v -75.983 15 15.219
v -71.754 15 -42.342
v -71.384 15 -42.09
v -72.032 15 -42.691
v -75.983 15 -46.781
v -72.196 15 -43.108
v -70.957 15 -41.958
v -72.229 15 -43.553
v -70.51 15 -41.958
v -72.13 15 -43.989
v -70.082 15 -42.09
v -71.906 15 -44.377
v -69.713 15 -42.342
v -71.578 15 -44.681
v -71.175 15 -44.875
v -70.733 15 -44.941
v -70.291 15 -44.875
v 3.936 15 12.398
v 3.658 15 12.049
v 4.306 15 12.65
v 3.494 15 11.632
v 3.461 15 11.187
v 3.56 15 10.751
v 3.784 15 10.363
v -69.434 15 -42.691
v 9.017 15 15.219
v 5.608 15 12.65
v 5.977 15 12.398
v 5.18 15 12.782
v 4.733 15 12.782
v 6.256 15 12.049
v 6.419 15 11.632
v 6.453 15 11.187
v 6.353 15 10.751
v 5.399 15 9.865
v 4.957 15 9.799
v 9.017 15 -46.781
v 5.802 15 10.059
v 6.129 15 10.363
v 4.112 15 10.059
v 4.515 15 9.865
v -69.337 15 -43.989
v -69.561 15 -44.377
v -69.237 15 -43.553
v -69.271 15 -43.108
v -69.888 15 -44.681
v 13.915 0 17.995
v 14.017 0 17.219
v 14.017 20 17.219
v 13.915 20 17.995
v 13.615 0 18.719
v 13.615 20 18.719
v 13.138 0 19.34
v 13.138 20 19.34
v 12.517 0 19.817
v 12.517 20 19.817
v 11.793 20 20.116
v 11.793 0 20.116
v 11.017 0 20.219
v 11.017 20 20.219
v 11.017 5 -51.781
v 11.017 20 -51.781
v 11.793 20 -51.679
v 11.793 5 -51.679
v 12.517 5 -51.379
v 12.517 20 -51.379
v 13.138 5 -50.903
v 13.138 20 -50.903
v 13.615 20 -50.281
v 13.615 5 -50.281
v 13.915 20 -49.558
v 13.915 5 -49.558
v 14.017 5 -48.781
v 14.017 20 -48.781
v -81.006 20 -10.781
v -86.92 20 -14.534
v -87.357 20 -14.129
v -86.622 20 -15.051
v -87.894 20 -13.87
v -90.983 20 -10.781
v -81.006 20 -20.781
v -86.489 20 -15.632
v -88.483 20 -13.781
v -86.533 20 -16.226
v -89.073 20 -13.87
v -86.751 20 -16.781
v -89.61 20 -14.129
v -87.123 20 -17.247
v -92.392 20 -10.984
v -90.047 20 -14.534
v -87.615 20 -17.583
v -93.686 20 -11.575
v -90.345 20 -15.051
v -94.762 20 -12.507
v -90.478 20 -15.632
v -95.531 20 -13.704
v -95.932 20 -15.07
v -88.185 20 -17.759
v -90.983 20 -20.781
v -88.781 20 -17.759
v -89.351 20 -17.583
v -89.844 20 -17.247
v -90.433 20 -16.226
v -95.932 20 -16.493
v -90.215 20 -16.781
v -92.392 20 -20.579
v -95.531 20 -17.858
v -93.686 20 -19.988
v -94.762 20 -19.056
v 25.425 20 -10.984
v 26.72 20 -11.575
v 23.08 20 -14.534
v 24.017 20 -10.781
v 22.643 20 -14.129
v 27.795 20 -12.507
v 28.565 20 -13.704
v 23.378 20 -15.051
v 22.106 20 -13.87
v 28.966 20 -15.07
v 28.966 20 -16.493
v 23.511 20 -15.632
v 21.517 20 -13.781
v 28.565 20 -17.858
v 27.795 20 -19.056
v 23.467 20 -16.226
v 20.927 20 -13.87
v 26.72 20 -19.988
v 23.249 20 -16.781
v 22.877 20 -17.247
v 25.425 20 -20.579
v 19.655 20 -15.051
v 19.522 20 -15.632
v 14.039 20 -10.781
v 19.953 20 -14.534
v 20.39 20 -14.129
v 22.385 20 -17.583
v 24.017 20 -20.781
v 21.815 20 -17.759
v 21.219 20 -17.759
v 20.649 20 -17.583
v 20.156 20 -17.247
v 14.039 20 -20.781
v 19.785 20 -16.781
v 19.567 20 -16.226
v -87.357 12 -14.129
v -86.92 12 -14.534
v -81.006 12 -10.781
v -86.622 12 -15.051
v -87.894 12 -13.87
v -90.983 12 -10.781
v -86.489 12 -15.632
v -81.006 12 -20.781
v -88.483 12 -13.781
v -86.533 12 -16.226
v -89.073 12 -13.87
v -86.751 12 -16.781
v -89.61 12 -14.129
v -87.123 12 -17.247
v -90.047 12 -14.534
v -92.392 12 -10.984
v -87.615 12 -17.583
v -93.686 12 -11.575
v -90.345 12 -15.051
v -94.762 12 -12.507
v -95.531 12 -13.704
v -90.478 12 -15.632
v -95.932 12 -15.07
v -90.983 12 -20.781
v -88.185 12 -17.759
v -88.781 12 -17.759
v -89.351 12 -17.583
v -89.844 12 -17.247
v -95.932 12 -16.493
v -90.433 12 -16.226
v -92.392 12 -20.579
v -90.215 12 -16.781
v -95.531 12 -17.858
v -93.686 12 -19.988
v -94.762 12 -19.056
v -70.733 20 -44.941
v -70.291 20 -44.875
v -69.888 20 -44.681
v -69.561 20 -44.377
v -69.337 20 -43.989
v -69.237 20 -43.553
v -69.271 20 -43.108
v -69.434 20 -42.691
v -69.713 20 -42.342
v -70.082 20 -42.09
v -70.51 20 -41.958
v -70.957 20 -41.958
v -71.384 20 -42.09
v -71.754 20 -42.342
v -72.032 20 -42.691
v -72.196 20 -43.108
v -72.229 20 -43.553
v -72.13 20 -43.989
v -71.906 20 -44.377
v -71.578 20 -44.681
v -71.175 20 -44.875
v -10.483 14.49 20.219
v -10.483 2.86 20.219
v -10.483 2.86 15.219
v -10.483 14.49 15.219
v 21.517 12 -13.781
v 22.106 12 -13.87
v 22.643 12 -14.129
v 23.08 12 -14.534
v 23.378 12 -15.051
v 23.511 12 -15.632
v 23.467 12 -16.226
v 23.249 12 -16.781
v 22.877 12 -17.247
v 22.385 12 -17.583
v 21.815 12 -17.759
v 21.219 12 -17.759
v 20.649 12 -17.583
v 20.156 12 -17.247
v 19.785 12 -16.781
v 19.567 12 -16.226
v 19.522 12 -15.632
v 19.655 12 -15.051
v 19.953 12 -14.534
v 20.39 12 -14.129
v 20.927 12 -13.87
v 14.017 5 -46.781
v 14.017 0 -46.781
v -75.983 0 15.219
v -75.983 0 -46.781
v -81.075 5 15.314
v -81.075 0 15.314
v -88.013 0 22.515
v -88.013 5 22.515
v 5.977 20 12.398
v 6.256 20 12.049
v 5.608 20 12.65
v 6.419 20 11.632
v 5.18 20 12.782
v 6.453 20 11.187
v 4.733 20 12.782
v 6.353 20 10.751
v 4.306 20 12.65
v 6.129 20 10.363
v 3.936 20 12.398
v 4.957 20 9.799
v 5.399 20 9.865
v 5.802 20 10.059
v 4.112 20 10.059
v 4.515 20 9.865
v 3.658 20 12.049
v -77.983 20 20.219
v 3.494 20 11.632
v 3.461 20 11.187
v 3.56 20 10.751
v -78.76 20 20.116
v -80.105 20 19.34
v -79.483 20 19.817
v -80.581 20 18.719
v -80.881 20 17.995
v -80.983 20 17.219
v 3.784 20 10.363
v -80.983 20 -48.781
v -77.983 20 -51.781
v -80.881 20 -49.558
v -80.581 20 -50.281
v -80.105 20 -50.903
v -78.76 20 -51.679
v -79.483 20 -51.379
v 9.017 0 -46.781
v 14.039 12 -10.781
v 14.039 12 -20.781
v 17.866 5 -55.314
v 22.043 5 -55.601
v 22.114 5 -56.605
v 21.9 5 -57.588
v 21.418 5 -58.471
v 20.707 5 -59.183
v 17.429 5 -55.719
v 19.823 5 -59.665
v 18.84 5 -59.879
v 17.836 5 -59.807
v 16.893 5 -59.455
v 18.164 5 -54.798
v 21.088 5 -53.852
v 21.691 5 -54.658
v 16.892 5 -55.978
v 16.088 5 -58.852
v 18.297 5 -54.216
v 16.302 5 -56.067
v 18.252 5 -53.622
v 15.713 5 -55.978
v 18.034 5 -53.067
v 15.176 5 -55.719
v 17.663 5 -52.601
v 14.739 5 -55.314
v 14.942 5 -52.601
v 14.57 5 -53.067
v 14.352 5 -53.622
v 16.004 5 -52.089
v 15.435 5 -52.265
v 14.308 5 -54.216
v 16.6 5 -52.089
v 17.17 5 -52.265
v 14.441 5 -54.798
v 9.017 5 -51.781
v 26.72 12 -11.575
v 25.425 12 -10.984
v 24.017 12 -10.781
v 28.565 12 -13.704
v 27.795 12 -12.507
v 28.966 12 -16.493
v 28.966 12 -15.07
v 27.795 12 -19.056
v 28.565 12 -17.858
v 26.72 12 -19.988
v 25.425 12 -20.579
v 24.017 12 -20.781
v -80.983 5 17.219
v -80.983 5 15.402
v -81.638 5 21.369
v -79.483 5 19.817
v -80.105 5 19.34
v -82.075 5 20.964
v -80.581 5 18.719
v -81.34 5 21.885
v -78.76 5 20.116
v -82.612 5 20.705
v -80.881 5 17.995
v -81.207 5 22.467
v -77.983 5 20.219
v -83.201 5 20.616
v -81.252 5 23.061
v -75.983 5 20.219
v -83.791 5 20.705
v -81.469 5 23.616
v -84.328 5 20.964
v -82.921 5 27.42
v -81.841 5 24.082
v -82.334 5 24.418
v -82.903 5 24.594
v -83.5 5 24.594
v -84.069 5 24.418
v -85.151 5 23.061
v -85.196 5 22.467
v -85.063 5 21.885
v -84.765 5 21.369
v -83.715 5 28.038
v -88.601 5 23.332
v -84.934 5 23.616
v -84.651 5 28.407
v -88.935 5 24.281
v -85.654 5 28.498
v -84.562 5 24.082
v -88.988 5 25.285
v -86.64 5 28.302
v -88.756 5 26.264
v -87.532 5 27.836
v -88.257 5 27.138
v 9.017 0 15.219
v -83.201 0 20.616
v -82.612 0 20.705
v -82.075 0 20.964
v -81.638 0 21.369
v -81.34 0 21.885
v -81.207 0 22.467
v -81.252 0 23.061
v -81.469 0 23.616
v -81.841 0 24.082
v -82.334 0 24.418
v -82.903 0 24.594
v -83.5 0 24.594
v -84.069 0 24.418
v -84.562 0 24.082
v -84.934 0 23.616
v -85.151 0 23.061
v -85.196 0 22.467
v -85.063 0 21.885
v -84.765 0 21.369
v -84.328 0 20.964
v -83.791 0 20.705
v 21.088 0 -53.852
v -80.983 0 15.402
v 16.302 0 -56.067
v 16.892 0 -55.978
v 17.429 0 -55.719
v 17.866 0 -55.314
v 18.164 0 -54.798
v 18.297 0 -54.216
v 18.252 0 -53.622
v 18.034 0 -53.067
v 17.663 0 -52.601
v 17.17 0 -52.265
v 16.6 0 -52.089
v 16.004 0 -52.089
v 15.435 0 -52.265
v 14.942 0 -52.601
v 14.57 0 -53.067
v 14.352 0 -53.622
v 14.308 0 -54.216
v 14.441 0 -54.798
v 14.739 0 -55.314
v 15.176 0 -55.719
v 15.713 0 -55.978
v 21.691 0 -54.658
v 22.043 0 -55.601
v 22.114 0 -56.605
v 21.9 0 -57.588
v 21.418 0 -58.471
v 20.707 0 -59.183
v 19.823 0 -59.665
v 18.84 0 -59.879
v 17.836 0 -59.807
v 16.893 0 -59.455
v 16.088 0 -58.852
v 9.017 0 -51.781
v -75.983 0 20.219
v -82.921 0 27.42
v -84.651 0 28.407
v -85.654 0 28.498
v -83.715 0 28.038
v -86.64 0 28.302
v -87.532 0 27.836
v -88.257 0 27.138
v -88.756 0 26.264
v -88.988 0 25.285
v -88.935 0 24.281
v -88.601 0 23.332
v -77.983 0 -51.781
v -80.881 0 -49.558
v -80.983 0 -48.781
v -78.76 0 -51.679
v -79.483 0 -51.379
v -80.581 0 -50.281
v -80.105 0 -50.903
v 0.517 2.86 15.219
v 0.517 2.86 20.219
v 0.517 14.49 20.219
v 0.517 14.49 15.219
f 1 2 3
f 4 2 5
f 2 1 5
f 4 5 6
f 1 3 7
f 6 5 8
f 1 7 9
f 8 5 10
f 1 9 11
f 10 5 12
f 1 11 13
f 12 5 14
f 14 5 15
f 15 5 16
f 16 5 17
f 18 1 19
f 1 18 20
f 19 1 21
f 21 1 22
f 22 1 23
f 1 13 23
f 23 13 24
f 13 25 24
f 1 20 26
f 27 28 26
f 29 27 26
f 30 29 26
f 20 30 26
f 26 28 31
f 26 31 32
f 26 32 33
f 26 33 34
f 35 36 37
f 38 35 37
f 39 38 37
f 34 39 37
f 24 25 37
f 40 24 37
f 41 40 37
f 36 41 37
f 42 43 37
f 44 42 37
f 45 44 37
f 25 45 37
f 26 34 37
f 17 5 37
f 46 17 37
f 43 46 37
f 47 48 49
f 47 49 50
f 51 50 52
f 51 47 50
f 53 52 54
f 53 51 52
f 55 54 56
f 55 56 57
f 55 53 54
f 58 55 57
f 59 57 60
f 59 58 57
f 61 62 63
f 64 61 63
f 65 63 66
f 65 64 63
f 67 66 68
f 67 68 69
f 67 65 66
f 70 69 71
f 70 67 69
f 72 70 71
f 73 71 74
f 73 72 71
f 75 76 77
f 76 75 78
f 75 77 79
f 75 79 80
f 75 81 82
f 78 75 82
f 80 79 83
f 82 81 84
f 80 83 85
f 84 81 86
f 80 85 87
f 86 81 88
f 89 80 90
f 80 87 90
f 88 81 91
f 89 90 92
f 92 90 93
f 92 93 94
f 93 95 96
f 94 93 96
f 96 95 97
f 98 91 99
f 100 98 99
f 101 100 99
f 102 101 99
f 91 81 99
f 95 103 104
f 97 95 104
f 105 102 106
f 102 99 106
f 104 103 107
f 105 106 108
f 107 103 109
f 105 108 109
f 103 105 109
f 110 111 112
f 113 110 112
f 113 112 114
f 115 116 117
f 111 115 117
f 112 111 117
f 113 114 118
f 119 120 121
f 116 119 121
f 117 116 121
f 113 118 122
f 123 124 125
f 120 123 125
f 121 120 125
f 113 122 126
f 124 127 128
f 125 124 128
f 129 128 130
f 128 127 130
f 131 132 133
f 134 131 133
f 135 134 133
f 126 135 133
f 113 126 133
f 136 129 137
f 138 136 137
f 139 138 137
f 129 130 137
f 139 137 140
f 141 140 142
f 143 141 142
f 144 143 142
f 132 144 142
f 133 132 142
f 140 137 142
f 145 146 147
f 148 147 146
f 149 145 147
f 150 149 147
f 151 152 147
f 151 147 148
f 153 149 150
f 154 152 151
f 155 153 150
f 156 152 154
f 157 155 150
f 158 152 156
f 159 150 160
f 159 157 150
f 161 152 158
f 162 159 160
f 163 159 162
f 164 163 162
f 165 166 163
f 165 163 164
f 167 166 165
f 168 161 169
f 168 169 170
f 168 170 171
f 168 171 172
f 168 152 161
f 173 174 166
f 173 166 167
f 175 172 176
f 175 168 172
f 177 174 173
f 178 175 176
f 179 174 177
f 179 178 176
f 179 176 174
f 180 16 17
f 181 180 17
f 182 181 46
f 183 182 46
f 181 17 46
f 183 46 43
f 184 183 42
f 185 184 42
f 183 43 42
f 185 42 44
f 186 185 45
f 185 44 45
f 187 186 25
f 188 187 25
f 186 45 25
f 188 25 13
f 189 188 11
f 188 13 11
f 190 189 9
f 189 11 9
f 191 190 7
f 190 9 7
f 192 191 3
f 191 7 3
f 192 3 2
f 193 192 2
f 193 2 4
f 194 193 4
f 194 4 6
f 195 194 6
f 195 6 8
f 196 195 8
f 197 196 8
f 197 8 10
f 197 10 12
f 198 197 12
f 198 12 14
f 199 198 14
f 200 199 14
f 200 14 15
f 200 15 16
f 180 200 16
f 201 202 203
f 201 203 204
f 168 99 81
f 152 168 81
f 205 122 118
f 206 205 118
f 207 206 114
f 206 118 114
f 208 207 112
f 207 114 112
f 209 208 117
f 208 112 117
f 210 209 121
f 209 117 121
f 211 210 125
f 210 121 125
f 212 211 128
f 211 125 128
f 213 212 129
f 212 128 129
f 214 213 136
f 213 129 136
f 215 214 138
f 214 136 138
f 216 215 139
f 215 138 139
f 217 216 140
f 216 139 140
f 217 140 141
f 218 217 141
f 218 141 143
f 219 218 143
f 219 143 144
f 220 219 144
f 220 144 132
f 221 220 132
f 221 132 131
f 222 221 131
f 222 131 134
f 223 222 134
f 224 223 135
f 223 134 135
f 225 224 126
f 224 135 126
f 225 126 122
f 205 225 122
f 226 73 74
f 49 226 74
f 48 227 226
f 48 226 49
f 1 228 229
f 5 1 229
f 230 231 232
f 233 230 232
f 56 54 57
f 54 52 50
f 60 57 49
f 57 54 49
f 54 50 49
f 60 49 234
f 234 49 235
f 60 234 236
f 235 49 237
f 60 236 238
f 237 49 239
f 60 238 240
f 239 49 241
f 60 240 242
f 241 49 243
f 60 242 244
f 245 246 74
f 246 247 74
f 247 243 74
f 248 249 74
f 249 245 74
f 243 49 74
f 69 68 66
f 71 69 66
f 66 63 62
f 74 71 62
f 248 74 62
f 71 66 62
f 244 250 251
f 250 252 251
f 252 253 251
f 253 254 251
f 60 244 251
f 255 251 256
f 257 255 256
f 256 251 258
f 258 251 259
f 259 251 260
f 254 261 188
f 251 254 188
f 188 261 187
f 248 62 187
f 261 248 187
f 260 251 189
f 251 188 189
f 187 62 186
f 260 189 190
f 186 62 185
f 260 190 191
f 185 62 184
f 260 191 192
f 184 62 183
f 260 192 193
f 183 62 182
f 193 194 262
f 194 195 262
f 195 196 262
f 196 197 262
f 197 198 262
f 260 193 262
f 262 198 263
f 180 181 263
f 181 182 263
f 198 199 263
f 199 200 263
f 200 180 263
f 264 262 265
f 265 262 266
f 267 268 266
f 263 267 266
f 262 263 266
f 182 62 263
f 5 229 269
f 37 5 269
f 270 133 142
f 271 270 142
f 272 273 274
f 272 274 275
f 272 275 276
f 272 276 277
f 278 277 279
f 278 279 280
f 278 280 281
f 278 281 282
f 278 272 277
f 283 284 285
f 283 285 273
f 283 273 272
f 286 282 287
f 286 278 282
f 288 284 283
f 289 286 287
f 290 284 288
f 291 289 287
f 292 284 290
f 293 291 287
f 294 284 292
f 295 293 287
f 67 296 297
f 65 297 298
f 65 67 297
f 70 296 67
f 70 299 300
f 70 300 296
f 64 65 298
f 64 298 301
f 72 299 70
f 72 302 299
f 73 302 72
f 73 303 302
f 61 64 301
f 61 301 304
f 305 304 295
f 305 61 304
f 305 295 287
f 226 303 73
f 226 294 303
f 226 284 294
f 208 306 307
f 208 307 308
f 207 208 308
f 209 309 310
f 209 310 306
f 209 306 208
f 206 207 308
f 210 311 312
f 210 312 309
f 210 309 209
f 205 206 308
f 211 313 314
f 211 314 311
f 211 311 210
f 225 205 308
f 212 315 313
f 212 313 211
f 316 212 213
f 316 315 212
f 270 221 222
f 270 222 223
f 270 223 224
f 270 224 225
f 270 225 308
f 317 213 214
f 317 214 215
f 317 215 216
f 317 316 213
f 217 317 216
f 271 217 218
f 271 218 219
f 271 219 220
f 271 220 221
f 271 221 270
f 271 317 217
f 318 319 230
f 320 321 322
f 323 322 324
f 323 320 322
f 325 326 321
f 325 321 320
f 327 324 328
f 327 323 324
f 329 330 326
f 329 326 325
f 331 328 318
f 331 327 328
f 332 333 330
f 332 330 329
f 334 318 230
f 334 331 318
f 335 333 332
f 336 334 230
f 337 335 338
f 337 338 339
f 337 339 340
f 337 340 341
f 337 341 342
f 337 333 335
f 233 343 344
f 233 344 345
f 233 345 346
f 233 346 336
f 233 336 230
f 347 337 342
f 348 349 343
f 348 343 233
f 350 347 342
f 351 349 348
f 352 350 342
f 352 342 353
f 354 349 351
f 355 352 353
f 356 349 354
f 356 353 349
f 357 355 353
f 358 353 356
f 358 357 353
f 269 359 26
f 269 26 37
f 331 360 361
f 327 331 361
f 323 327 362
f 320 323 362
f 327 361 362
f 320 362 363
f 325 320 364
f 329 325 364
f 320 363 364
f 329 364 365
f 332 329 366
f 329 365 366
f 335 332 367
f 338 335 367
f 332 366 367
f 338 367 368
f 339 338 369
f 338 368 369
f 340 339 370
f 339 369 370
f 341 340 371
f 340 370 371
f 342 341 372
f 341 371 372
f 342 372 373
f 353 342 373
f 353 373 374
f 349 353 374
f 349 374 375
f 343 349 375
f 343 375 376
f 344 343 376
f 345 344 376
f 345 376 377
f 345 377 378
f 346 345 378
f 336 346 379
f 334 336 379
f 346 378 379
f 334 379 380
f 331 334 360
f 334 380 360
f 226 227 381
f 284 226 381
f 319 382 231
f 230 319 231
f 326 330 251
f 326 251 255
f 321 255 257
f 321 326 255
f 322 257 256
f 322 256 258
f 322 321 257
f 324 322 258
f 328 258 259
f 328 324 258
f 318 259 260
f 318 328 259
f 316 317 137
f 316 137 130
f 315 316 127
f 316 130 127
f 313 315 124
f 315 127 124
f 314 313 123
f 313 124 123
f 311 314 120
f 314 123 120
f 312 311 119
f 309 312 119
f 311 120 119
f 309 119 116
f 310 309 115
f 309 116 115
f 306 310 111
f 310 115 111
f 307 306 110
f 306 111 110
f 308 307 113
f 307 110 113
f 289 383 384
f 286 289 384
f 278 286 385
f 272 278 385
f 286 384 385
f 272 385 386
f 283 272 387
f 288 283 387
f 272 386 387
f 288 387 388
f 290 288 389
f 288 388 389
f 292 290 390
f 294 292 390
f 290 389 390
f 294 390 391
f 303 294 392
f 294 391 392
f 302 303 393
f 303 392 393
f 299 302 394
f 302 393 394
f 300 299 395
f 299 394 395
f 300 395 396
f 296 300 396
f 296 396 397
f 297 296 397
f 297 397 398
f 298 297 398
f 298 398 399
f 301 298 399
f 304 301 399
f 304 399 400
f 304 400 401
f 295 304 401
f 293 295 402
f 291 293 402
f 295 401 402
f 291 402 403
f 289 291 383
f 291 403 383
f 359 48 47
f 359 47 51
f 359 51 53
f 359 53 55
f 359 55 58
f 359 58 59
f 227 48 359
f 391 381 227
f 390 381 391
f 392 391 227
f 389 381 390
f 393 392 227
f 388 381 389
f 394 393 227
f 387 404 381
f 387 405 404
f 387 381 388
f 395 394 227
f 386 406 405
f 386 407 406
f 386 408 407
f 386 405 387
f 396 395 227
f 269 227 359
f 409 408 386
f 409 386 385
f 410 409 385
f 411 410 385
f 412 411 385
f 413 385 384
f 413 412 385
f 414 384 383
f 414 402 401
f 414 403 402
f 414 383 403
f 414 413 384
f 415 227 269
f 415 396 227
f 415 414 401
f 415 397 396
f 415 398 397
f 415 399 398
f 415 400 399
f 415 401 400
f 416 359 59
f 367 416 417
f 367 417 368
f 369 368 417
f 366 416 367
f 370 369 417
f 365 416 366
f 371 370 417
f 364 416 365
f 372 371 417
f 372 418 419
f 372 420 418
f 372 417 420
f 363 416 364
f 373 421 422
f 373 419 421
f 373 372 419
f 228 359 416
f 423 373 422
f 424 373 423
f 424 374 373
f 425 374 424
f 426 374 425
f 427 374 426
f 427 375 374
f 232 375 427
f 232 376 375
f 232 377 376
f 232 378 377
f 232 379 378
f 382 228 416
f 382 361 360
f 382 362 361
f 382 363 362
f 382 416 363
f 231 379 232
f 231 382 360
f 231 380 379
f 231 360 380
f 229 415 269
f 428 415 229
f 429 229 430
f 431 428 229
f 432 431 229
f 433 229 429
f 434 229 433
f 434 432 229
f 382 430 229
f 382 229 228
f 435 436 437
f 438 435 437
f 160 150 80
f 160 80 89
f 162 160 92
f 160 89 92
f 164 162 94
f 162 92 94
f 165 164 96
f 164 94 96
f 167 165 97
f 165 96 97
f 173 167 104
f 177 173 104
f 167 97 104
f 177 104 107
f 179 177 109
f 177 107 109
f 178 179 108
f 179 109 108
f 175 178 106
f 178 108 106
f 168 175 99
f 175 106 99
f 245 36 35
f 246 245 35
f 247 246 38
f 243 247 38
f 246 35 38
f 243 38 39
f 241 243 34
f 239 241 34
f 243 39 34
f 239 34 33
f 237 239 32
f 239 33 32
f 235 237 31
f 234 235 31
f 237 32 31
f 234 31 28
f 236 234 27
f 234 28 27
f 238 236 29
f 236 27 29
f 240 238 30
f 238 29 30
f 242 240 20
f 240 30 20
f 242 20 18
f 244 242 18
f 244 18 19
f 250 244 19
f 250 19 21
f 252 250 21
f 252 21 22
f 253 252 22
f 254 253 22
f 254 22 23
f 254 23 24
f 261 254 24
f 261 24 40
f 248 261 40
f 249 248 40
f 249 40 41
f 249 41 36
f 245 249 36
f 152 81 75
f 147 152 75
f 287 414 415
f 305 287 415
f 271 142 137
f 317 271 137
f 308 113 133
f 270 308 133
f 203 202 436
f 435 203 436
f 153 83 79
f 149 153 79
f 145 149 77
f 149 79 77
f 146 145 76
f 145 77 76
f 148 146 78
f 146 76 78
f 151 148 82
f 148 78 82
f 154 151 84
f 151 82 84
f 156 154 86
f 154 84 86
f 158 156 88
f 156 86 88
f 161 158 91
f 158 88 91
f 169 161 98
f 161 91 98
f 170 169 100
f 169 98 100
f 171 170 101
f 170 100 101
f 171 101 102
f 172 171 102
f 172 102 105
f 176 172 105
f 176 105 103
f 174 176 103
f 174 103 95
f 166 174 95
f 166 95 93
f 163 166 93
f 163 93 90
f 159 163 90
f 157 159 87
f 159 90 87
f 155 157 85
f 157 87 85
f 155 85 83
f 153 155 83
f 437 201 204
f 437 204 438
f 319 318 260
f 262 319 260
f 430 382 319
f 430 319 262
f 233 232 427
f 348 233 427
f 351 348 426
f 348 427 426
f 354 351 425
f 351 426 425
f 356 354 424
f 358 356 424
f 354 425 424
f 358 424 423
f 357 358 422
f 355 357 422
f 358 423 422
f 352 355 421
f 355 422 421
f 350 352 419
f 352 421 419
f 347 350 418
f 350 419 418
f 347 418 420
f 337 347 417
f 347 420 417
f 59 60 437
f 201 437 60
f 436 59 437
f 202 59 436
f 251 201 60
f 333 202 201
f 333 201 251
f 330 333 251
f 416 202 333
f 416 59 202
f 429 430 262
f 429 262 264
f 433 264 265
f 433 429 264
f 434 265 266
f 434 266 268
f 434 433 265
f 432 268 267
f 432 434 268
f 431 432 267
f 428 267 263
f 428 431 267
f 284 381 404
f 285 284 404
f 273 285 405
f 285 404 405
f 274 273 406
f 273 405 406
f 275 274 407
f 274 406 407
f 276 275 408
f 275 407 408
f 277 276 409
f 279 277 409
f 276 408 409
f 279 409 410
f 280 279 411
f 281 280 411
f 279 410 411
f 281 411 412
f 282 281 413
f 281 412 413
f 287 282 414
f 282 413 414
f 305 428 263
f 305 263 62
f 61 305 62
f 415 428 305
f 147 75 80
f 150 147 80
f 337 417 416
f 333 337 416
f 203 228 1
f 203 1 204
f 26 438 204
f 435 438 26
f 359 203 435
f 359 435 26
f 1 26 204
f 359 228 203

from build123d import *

# Parameters (mm, degrees)
RESSALTO_EXTRUS_O2_DEPTH   = 20
CORTE_EXTRUS_O1_START      = -20
ESBO_O5_W                  = 85
ESBO_O5_H                  = 62
CORTE_EXTRUS_O1_DEPTH      = 15
CORTE_EXTRUS_O2_REACH      = 112.192
ESBO_O6_W                  = 11
ESBO_O6_H                  = 11.63
ESBO_O8_R                  = 2
RESSALTO_EXTRUS_O5_DEPTH   = 5
ESBO_O7_R                  = 2
RESSALTO_EXTRUS_O6_DEPTH   = 8
RESSALTO_EXTRUS_O6_2_DEPTH = 8
ESBO_O9_R                  = 1.5
CORTE_EXTRUS_O3_DEPTH      = 115.124294054


with BuildPart() as part:
    # Esboço1 → Ressalto-extrusão2 (new body)
    with BuildSketch(Plane(origin=(0, 0, 0), x_dir=(1, 0, 0), z_dir=(0, 1, 0))):
        with BuildLine():
            Line((-77.983264016, 51.781356356), (11.016735984, 51.781356356))
            ThreePointArc((11.016735984, 51.781356356), (13.138056327, 50.902676699), (14.016735984, 48.781356356))
            Line((14.016735984, 48.781356356), (14.016735984, -17.218643644))
            ThreePointArc((14.016735984, -17.218643644), (13.138056327, -19.339963988), (11.016735984, -20.218643644))
            Line((11.016735984, -20.218643644), (-77.983264016, -20.218643644))
            ThreePointArc((-77.983264016, -20.218643644), (-80.10458436, -19.339963988), (-80.983264016, -17.218643644))
            Line((-80.983264016, -17.218643644), (-80.983264016, 48.781356356))
            ThreePointArc((-80.983264016, 48.781356356), (-80.10458436, 50.902676699), (-77.983264016, 51.781356356))
        make_face()
    extrude(amount=RESSALTO_EXTRUS_O2_DEPTH)

    # Esboço5 → Corte-extrusão1 (cut)
    with BuildSketch(Plane(origin=(0, 20, 0), x_dir=(1, 0, 0), z_dir=(0, 1, 0)).offset(CORTE_EXTRUS_O1_START)):
        with Locations((-33.483264016, 15.781356356)):
            Rectangle(ESBO_O5_W, ESBO_O5_H)
    extrude(amount=CORTE_EXTRUS_O1_DEPTH, mode=Mode.SUBTRACT)

    # Esboço6 → Corte-extrusão2 (cut, up to next)
    with BuildSketch(Plane.XY.offset(20.218643644), mode=Mode.PRIVATE) as corte_extrus_o2_sk1:
        with Locations((-4.983264016, 8.675)):
            Rectangle(ESBO_O6_W, ESBO_O6_H)
    corte_extrus_o2_tool1 = extrude(corte_extrus_o2_sk1.sketch, amount=-CORTE_EXTRUS_O2_REACH, mode=Mode.PRIVATE) & part.part
    add(corte_extrus_o2_tool1.solids().sort_by_distance((-4.983264, 8.675, 20.218644))[0], mode=Mode.SUBTRACT)

    # Esboço8 → Ressalto-extrusão5 (add)
    # profile 1 of 2: a face of its own
    with BuildSketch(Plane.XZ):
        with BuildLine():
            Line((9.016735984, -51.781356356), (14.016735984, -46.781356356))
            Line((14.016735984, -46.781356356), (21.087803796, -53.852424167))
            ThreePointArc((21.087803796, -53.852424167), (21.087803796, -58.852424167), (16.087803796, -58.852424167))
            Line((16.087803796, -58.852424167), (9.016735984, -51.781356356))
        make_face()
        with Locations(Location((16.30226989, -54.066890262, 0), (0, 0, 270))):
            Circle(ESBO_O8_R, mode=Mode.SUBTRACT)
    # profile 2 of 2: a face of its own
    with BuildSketch(Plane.XZ):
        with BuildLine():
            Line((-75.983264016, 20.218643644), (-81.074651757, 15.313501326))
            Line((-81.074651757, 15.313501326), (-88.012774398, 22.515060478))
            ThreePointArc((-88.012774398, 22.515060478), (-87.919651687, 27.513325508), (-82.921386657, 27.420202797))
            Line((-82.921386657, 27.420202797), (-75.983264016, 20.218643644))
        make_face()
        with Locations(Location((-83.201457851, 22.615984576, 0), (0, 0, 270))):
            Circle(ESBO_O8_R, mode=Mode.SUBTRACT)
    extrude(amount=-RESSALTO_EXTRUS_O5_DEPTH)

    # Esboço9 → Corte-extrusão3 (cut, through all)
    with BuildSketch(Plane.XZ.offset(-15)):
        with Locations(Location((-70.733264016, -43.441356356, 0), (0, 0, 270))):
            Circle(ESBO_O9_R)
        with Locations(Location((4.956735984, 11.298643644, 0), (0, 0, 270))):
            Circle(ESBO_O9_R)
    extrude(amount=-CORTE_EXTRUS_O3_DEPTH, mode=Mode.SUBTRACT)


with BuildPart() as body_2:
    # Esboço7 → Ressalto-extrusão6 (new body)
    with BuildSketch(Plane(origin=(0, 20, 0), x_dir=(1, 0, 0), z_dir=(0, 1, 0))):
        with BuildLine():
            ThreePointArc((-90.983264016, 10.781356356), (-95.983264016, 15.781356356), (-90.983264016, 20.781356356))
            Line((-90.983264016, 20.781356356), (-81.005988355, 20.781356356))
            Line((-81.005988355, 20.781356356), (-81.005988355, 10.781356356))
            Line((-81.005988355, 10.781356356), (-90.983264016, 10.781356356))
        make_face()
        with Locations(Location((-88.483264016, 15.781356356, 0), (0, 0, 270))):
            Circle(ESBO_O7_R, mode=Mode.SUBTRACT)
    extrude(amount=-RESSALTO_EXTRUS_O6_DEPTH)


with BuildPart() as body_3:
    # Esboço7 → Ressalto-extrus_o6 2 (new body)
    with BuildSketch(Plane(origin=(0, 20, 0), x_dir=(1, 0, 0), z_dir=(0, 1, 0))):
        with BuildLine():
            Line((24.016735984, 10.781356356), (14.039460323, 10.781356356))
            Line((14.039460323, 10.781356356), (14.039460323, 20.781356356))
            Line((14.039460323, 20.781356356), (24.016735984, 20.781356356))
            ThreePointArc((24.016735984, 20.781356356), (29.016735984, 15.781356356), (24.016735984, 10.781356356))
        make_face()
        with Locations(Location((21.516735984, 15.781356356, 0), (0, 0, 270))):
            Circle(ESBO_O7_R, mode=Mode.SUBTRACT)
    extrude(amount=-RESSALTO_EXTRUS_O6_2_DEPTH)


solid = Compound([part.part, body_2.part, body_3.part])
